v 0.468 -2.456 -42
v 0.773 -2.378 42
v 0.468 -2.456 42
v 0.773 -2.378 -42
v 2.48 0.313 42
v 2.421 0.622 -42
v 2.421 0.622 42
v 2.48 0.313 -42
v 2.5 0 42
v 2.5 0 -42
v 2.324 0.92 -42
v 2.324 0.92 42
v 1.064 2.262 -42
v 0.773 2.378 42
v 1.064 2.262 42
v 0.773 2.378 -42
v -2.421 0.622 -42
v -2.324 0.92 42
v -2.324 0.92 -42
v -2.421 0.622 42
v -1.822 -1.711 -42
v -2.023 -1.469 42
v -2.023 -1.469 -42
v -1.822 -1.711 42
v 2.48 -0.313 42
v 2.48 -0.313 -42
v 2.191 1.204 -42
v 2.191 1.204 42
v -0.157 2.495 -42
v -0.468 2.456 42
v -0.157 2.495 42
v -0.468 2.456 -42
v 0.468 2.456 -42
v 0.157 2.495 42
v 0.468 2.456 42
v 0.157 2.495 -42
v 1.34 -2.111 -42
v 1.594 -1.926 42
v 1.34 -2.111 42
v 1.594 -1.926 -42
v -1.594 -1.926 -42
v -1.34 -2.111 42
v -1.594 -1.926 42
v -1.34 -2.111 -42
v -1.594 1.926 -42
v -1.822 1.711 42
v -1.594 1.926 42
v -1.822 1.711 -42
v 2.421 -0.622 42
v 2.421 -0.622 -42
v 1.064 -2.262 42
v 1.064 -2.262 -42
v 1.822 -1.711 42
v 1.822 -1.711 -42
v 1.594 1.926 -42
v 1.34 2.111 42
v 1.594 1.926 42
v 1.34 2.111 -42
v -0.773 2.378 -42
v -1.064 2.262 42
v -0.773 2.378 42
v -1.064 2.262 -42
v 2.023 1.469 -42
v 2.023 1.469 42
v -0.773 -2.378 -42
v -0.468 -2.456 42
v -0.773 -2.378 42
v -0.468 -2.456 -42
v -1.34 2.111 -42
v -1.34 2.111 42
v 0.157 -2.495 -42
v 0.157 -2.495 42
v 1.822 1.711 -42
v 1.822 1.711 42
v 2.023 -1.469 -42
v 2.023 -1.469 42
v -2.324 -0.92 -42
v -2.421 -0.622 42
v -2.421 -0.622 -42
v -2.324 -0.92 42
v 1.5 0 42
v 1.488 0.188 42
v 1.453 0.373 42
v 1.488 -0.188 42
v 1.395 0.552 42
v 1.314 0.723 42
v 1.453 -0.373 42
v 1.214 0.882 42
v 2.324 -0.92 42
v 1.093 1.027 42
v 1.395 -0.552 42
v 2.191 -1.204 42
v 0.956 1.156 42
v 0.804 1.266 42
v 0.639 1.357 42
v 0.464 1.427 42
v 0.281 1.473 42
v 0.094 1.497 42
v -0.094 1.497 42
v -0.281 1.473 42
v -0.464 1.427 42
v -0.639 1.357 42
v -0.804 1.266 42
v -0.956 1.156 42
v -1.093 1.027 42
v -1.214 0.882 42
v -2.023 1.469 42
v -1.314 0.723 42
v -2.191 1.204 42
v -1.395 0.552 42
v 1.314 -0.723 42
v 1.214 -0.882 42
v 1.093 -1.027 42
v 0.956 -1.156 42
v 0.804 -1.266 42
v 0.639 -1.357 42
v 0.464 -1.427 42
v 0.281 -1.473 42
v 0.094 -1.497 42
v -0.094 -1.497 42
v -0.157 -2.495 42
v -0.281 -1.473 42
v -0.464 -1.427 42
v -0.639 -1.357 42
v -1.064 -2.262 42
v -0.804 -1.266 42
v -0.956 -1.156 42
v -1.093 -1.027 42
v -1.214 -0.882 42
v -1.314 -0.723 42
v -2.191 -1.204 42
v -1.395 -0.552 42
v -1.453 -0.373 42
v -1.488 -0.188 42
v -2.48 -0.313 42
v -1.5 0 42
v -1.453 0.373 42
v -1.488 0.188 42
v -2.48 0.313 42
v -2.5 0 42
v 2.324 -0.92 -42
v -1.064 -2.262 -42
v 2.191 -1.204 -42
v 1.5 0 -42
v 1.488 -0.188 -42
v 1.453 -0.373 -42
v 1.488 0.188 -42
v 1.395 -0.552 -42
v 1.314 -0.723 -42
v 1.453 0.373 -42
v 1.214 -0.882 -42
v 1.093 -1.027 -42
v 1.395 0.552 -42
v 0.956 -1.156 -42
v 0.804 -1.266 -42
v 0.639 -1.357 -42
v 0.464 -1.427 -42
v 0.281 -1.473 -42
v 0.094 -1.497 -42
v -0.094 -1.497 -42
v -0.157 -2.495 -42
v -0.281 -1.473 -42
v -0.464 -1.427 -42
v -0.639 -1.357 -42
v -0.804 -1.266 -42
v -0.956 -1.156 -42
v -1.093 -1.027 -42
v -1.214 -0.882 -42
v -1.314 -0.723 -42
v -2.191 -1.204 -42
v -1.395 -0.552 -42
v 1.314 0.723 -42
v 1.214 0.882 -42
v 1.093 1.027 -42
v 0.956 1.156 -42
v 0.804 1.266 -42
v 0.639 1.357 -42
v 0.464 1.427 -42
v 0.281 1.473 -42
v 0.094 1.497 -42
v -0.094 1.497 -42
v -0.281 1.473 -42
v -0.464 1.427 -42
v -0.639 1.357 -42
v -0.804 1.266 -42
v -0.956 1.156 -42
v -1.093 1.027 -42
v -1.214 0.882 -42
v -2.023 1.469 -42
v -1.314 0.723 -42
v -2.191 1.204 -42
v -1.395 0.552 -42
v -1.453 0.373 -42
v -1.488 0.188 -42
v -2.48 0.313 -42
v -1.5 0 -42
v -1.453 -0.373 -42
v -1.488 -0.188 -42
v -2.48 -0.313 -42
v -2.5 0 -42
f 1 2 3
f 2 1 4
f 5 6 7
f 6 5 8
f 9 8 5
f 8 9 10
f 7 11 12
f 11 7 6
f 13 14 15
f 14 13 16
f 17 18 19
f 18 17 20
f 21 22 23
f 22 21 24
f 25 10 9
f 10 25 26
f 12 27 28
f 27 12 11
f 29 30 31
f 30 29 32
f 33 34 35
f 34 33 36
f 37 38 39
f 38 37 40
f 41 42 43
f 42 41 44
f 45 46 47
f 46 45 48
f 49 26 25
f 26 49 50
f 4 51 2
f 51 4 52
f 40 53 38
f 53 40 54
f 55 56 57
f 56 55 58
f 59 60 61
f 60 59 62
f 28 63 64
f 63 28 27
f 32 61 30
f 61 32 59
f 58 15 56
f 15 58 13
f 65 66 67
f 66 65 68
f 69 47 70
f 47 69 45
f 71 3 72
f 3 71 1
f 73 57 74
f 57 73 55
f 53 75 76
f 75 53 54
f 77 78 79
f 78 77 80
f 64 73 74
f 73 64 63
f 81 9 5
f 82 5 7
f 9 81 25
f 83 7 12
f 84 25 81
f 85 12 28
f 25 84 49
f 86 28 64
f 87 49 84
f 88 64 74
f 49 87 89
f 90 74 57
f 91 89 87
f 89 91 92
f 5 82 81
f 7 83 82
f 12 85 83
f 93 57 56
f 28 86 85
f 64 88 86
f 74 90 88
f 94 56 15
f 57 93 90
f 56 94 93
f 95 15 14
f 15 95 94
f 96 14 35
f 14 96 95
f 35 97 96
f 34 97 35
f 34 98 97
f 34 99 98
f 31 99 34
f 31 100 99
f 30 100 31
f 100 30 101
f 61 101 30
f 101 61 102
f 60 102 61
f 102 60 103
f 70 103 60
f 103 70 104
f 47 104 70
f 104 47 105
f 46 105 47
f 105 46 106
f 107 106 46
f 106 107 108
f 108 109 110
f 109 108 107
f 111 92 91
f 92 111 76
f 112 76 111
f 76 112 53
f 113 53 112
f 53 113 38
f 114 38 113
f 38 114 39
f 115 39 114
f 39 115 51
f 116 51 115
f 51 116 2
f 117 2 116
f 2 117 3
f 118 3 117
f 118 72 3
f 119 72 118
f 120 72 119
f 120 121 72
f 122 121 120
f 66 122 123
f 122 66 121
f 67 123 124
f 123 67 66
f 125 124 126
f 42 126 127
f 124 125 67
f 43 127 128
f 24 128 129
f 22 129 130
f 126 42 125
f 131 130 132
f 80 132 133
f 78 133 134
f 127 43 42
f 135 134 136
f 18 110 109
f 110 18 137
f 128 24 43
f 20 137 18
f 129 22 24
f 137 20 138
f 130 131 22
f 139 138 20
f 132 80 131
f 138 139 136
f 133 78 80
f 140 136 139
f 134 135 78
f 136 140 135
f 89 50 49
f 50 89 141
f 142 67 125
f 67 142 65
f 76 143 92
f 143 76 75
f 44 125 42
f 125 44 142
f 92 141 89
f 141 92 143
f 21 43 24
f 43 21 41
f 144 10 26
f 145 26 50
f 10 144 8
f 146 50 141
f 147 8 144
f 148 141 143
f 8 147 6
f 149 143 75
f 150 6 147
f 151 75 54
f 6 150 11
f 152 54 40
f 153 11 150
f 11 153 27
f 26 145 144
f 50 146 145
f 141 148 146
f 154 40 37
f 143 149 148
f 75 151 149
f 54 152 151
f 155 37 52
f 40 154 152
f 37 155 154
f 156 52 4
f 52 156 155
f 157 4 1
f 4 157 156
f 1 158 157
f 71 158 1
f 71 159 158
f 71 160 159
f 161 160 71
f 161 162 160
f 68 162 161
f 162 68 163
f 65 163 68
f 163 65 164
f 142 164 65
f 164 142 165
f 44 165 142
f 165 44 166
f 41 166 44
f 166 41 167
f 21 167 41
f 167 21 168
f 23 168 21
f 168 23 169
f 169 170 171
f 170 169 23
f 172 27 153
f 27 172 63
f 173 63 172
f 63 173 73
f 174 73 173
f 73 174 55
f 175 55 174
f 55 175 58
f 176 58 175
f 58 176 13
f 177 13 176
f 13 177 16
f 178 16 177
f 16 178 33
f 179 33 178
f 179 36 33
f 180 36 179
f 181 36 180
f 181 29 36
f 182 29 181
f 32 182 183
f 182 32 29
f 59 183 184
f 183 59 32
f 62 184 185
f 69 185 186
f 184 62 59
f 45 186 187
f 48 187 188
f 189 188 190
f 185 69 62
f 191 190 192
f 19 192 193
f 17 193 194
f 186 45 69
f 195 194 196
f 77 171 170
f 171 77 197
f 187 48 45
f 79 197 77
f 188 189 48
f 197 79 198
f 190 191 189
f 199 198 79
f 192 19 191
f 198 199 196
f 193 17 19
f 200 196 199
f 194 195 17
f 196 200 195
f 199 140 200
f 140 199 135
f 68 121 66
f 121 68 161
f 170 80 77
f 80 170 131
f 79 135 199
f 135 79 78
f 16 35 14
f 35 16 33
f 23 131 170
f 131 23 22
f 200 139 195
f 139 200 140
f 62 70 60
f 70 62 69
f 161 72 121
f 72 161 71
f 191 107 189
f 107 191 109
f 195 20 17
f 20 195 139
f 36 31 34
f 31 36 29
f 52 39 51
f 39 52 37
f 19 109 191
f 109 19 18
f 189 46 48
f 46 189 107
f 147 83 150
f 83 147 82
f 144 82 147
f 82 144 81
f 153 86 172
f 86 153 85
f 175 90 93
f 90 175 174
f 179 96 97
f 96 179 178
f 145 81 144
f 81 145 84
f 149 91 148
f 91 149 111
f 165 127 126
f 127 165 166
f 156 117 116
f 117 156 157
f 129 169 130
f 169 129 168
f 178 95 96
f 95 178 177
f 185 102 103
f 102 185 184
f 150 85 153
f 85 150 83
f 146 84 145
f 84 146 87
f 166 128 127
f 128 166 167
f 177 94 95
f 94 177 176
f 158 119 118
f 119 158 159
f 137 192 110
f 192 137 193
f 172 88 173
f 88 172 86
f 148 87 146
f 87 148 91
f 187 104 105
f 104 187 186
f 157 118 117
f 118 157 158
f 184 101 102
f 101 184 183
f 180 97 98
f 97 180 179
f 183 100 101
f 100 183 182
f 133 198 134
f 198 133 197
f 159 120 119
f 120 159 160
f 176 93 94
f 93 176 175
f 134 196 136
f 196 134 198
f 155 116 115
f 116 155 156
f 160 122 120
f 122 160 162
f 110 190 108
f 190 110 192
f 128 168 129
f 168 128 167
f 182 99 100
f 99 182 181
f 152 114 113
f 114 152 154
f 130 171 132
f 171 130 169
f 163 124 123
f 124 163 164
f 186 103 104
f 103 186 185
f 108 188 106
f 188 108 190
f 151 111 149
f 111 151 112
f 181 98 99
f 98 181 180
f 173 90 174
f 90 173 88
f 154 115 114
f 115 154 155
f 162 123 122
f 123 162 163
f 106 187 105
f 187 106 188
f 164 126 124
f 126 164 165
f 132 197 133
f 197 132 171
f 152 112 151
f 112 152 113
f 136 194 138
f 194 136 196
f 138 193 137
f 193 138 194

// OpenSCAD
$fn = 50;


difference() {
	union() {
		translate(v = [0, 0, -42.0000000000]) {
			cylinder(h = 84, r = 2.5000000000);
		}
	}
	union() {
		translate(v = [0, 0, -100.0000000000]) {
			cylinder(h = 200, r = 1.5000000000);
		}
	}
}
